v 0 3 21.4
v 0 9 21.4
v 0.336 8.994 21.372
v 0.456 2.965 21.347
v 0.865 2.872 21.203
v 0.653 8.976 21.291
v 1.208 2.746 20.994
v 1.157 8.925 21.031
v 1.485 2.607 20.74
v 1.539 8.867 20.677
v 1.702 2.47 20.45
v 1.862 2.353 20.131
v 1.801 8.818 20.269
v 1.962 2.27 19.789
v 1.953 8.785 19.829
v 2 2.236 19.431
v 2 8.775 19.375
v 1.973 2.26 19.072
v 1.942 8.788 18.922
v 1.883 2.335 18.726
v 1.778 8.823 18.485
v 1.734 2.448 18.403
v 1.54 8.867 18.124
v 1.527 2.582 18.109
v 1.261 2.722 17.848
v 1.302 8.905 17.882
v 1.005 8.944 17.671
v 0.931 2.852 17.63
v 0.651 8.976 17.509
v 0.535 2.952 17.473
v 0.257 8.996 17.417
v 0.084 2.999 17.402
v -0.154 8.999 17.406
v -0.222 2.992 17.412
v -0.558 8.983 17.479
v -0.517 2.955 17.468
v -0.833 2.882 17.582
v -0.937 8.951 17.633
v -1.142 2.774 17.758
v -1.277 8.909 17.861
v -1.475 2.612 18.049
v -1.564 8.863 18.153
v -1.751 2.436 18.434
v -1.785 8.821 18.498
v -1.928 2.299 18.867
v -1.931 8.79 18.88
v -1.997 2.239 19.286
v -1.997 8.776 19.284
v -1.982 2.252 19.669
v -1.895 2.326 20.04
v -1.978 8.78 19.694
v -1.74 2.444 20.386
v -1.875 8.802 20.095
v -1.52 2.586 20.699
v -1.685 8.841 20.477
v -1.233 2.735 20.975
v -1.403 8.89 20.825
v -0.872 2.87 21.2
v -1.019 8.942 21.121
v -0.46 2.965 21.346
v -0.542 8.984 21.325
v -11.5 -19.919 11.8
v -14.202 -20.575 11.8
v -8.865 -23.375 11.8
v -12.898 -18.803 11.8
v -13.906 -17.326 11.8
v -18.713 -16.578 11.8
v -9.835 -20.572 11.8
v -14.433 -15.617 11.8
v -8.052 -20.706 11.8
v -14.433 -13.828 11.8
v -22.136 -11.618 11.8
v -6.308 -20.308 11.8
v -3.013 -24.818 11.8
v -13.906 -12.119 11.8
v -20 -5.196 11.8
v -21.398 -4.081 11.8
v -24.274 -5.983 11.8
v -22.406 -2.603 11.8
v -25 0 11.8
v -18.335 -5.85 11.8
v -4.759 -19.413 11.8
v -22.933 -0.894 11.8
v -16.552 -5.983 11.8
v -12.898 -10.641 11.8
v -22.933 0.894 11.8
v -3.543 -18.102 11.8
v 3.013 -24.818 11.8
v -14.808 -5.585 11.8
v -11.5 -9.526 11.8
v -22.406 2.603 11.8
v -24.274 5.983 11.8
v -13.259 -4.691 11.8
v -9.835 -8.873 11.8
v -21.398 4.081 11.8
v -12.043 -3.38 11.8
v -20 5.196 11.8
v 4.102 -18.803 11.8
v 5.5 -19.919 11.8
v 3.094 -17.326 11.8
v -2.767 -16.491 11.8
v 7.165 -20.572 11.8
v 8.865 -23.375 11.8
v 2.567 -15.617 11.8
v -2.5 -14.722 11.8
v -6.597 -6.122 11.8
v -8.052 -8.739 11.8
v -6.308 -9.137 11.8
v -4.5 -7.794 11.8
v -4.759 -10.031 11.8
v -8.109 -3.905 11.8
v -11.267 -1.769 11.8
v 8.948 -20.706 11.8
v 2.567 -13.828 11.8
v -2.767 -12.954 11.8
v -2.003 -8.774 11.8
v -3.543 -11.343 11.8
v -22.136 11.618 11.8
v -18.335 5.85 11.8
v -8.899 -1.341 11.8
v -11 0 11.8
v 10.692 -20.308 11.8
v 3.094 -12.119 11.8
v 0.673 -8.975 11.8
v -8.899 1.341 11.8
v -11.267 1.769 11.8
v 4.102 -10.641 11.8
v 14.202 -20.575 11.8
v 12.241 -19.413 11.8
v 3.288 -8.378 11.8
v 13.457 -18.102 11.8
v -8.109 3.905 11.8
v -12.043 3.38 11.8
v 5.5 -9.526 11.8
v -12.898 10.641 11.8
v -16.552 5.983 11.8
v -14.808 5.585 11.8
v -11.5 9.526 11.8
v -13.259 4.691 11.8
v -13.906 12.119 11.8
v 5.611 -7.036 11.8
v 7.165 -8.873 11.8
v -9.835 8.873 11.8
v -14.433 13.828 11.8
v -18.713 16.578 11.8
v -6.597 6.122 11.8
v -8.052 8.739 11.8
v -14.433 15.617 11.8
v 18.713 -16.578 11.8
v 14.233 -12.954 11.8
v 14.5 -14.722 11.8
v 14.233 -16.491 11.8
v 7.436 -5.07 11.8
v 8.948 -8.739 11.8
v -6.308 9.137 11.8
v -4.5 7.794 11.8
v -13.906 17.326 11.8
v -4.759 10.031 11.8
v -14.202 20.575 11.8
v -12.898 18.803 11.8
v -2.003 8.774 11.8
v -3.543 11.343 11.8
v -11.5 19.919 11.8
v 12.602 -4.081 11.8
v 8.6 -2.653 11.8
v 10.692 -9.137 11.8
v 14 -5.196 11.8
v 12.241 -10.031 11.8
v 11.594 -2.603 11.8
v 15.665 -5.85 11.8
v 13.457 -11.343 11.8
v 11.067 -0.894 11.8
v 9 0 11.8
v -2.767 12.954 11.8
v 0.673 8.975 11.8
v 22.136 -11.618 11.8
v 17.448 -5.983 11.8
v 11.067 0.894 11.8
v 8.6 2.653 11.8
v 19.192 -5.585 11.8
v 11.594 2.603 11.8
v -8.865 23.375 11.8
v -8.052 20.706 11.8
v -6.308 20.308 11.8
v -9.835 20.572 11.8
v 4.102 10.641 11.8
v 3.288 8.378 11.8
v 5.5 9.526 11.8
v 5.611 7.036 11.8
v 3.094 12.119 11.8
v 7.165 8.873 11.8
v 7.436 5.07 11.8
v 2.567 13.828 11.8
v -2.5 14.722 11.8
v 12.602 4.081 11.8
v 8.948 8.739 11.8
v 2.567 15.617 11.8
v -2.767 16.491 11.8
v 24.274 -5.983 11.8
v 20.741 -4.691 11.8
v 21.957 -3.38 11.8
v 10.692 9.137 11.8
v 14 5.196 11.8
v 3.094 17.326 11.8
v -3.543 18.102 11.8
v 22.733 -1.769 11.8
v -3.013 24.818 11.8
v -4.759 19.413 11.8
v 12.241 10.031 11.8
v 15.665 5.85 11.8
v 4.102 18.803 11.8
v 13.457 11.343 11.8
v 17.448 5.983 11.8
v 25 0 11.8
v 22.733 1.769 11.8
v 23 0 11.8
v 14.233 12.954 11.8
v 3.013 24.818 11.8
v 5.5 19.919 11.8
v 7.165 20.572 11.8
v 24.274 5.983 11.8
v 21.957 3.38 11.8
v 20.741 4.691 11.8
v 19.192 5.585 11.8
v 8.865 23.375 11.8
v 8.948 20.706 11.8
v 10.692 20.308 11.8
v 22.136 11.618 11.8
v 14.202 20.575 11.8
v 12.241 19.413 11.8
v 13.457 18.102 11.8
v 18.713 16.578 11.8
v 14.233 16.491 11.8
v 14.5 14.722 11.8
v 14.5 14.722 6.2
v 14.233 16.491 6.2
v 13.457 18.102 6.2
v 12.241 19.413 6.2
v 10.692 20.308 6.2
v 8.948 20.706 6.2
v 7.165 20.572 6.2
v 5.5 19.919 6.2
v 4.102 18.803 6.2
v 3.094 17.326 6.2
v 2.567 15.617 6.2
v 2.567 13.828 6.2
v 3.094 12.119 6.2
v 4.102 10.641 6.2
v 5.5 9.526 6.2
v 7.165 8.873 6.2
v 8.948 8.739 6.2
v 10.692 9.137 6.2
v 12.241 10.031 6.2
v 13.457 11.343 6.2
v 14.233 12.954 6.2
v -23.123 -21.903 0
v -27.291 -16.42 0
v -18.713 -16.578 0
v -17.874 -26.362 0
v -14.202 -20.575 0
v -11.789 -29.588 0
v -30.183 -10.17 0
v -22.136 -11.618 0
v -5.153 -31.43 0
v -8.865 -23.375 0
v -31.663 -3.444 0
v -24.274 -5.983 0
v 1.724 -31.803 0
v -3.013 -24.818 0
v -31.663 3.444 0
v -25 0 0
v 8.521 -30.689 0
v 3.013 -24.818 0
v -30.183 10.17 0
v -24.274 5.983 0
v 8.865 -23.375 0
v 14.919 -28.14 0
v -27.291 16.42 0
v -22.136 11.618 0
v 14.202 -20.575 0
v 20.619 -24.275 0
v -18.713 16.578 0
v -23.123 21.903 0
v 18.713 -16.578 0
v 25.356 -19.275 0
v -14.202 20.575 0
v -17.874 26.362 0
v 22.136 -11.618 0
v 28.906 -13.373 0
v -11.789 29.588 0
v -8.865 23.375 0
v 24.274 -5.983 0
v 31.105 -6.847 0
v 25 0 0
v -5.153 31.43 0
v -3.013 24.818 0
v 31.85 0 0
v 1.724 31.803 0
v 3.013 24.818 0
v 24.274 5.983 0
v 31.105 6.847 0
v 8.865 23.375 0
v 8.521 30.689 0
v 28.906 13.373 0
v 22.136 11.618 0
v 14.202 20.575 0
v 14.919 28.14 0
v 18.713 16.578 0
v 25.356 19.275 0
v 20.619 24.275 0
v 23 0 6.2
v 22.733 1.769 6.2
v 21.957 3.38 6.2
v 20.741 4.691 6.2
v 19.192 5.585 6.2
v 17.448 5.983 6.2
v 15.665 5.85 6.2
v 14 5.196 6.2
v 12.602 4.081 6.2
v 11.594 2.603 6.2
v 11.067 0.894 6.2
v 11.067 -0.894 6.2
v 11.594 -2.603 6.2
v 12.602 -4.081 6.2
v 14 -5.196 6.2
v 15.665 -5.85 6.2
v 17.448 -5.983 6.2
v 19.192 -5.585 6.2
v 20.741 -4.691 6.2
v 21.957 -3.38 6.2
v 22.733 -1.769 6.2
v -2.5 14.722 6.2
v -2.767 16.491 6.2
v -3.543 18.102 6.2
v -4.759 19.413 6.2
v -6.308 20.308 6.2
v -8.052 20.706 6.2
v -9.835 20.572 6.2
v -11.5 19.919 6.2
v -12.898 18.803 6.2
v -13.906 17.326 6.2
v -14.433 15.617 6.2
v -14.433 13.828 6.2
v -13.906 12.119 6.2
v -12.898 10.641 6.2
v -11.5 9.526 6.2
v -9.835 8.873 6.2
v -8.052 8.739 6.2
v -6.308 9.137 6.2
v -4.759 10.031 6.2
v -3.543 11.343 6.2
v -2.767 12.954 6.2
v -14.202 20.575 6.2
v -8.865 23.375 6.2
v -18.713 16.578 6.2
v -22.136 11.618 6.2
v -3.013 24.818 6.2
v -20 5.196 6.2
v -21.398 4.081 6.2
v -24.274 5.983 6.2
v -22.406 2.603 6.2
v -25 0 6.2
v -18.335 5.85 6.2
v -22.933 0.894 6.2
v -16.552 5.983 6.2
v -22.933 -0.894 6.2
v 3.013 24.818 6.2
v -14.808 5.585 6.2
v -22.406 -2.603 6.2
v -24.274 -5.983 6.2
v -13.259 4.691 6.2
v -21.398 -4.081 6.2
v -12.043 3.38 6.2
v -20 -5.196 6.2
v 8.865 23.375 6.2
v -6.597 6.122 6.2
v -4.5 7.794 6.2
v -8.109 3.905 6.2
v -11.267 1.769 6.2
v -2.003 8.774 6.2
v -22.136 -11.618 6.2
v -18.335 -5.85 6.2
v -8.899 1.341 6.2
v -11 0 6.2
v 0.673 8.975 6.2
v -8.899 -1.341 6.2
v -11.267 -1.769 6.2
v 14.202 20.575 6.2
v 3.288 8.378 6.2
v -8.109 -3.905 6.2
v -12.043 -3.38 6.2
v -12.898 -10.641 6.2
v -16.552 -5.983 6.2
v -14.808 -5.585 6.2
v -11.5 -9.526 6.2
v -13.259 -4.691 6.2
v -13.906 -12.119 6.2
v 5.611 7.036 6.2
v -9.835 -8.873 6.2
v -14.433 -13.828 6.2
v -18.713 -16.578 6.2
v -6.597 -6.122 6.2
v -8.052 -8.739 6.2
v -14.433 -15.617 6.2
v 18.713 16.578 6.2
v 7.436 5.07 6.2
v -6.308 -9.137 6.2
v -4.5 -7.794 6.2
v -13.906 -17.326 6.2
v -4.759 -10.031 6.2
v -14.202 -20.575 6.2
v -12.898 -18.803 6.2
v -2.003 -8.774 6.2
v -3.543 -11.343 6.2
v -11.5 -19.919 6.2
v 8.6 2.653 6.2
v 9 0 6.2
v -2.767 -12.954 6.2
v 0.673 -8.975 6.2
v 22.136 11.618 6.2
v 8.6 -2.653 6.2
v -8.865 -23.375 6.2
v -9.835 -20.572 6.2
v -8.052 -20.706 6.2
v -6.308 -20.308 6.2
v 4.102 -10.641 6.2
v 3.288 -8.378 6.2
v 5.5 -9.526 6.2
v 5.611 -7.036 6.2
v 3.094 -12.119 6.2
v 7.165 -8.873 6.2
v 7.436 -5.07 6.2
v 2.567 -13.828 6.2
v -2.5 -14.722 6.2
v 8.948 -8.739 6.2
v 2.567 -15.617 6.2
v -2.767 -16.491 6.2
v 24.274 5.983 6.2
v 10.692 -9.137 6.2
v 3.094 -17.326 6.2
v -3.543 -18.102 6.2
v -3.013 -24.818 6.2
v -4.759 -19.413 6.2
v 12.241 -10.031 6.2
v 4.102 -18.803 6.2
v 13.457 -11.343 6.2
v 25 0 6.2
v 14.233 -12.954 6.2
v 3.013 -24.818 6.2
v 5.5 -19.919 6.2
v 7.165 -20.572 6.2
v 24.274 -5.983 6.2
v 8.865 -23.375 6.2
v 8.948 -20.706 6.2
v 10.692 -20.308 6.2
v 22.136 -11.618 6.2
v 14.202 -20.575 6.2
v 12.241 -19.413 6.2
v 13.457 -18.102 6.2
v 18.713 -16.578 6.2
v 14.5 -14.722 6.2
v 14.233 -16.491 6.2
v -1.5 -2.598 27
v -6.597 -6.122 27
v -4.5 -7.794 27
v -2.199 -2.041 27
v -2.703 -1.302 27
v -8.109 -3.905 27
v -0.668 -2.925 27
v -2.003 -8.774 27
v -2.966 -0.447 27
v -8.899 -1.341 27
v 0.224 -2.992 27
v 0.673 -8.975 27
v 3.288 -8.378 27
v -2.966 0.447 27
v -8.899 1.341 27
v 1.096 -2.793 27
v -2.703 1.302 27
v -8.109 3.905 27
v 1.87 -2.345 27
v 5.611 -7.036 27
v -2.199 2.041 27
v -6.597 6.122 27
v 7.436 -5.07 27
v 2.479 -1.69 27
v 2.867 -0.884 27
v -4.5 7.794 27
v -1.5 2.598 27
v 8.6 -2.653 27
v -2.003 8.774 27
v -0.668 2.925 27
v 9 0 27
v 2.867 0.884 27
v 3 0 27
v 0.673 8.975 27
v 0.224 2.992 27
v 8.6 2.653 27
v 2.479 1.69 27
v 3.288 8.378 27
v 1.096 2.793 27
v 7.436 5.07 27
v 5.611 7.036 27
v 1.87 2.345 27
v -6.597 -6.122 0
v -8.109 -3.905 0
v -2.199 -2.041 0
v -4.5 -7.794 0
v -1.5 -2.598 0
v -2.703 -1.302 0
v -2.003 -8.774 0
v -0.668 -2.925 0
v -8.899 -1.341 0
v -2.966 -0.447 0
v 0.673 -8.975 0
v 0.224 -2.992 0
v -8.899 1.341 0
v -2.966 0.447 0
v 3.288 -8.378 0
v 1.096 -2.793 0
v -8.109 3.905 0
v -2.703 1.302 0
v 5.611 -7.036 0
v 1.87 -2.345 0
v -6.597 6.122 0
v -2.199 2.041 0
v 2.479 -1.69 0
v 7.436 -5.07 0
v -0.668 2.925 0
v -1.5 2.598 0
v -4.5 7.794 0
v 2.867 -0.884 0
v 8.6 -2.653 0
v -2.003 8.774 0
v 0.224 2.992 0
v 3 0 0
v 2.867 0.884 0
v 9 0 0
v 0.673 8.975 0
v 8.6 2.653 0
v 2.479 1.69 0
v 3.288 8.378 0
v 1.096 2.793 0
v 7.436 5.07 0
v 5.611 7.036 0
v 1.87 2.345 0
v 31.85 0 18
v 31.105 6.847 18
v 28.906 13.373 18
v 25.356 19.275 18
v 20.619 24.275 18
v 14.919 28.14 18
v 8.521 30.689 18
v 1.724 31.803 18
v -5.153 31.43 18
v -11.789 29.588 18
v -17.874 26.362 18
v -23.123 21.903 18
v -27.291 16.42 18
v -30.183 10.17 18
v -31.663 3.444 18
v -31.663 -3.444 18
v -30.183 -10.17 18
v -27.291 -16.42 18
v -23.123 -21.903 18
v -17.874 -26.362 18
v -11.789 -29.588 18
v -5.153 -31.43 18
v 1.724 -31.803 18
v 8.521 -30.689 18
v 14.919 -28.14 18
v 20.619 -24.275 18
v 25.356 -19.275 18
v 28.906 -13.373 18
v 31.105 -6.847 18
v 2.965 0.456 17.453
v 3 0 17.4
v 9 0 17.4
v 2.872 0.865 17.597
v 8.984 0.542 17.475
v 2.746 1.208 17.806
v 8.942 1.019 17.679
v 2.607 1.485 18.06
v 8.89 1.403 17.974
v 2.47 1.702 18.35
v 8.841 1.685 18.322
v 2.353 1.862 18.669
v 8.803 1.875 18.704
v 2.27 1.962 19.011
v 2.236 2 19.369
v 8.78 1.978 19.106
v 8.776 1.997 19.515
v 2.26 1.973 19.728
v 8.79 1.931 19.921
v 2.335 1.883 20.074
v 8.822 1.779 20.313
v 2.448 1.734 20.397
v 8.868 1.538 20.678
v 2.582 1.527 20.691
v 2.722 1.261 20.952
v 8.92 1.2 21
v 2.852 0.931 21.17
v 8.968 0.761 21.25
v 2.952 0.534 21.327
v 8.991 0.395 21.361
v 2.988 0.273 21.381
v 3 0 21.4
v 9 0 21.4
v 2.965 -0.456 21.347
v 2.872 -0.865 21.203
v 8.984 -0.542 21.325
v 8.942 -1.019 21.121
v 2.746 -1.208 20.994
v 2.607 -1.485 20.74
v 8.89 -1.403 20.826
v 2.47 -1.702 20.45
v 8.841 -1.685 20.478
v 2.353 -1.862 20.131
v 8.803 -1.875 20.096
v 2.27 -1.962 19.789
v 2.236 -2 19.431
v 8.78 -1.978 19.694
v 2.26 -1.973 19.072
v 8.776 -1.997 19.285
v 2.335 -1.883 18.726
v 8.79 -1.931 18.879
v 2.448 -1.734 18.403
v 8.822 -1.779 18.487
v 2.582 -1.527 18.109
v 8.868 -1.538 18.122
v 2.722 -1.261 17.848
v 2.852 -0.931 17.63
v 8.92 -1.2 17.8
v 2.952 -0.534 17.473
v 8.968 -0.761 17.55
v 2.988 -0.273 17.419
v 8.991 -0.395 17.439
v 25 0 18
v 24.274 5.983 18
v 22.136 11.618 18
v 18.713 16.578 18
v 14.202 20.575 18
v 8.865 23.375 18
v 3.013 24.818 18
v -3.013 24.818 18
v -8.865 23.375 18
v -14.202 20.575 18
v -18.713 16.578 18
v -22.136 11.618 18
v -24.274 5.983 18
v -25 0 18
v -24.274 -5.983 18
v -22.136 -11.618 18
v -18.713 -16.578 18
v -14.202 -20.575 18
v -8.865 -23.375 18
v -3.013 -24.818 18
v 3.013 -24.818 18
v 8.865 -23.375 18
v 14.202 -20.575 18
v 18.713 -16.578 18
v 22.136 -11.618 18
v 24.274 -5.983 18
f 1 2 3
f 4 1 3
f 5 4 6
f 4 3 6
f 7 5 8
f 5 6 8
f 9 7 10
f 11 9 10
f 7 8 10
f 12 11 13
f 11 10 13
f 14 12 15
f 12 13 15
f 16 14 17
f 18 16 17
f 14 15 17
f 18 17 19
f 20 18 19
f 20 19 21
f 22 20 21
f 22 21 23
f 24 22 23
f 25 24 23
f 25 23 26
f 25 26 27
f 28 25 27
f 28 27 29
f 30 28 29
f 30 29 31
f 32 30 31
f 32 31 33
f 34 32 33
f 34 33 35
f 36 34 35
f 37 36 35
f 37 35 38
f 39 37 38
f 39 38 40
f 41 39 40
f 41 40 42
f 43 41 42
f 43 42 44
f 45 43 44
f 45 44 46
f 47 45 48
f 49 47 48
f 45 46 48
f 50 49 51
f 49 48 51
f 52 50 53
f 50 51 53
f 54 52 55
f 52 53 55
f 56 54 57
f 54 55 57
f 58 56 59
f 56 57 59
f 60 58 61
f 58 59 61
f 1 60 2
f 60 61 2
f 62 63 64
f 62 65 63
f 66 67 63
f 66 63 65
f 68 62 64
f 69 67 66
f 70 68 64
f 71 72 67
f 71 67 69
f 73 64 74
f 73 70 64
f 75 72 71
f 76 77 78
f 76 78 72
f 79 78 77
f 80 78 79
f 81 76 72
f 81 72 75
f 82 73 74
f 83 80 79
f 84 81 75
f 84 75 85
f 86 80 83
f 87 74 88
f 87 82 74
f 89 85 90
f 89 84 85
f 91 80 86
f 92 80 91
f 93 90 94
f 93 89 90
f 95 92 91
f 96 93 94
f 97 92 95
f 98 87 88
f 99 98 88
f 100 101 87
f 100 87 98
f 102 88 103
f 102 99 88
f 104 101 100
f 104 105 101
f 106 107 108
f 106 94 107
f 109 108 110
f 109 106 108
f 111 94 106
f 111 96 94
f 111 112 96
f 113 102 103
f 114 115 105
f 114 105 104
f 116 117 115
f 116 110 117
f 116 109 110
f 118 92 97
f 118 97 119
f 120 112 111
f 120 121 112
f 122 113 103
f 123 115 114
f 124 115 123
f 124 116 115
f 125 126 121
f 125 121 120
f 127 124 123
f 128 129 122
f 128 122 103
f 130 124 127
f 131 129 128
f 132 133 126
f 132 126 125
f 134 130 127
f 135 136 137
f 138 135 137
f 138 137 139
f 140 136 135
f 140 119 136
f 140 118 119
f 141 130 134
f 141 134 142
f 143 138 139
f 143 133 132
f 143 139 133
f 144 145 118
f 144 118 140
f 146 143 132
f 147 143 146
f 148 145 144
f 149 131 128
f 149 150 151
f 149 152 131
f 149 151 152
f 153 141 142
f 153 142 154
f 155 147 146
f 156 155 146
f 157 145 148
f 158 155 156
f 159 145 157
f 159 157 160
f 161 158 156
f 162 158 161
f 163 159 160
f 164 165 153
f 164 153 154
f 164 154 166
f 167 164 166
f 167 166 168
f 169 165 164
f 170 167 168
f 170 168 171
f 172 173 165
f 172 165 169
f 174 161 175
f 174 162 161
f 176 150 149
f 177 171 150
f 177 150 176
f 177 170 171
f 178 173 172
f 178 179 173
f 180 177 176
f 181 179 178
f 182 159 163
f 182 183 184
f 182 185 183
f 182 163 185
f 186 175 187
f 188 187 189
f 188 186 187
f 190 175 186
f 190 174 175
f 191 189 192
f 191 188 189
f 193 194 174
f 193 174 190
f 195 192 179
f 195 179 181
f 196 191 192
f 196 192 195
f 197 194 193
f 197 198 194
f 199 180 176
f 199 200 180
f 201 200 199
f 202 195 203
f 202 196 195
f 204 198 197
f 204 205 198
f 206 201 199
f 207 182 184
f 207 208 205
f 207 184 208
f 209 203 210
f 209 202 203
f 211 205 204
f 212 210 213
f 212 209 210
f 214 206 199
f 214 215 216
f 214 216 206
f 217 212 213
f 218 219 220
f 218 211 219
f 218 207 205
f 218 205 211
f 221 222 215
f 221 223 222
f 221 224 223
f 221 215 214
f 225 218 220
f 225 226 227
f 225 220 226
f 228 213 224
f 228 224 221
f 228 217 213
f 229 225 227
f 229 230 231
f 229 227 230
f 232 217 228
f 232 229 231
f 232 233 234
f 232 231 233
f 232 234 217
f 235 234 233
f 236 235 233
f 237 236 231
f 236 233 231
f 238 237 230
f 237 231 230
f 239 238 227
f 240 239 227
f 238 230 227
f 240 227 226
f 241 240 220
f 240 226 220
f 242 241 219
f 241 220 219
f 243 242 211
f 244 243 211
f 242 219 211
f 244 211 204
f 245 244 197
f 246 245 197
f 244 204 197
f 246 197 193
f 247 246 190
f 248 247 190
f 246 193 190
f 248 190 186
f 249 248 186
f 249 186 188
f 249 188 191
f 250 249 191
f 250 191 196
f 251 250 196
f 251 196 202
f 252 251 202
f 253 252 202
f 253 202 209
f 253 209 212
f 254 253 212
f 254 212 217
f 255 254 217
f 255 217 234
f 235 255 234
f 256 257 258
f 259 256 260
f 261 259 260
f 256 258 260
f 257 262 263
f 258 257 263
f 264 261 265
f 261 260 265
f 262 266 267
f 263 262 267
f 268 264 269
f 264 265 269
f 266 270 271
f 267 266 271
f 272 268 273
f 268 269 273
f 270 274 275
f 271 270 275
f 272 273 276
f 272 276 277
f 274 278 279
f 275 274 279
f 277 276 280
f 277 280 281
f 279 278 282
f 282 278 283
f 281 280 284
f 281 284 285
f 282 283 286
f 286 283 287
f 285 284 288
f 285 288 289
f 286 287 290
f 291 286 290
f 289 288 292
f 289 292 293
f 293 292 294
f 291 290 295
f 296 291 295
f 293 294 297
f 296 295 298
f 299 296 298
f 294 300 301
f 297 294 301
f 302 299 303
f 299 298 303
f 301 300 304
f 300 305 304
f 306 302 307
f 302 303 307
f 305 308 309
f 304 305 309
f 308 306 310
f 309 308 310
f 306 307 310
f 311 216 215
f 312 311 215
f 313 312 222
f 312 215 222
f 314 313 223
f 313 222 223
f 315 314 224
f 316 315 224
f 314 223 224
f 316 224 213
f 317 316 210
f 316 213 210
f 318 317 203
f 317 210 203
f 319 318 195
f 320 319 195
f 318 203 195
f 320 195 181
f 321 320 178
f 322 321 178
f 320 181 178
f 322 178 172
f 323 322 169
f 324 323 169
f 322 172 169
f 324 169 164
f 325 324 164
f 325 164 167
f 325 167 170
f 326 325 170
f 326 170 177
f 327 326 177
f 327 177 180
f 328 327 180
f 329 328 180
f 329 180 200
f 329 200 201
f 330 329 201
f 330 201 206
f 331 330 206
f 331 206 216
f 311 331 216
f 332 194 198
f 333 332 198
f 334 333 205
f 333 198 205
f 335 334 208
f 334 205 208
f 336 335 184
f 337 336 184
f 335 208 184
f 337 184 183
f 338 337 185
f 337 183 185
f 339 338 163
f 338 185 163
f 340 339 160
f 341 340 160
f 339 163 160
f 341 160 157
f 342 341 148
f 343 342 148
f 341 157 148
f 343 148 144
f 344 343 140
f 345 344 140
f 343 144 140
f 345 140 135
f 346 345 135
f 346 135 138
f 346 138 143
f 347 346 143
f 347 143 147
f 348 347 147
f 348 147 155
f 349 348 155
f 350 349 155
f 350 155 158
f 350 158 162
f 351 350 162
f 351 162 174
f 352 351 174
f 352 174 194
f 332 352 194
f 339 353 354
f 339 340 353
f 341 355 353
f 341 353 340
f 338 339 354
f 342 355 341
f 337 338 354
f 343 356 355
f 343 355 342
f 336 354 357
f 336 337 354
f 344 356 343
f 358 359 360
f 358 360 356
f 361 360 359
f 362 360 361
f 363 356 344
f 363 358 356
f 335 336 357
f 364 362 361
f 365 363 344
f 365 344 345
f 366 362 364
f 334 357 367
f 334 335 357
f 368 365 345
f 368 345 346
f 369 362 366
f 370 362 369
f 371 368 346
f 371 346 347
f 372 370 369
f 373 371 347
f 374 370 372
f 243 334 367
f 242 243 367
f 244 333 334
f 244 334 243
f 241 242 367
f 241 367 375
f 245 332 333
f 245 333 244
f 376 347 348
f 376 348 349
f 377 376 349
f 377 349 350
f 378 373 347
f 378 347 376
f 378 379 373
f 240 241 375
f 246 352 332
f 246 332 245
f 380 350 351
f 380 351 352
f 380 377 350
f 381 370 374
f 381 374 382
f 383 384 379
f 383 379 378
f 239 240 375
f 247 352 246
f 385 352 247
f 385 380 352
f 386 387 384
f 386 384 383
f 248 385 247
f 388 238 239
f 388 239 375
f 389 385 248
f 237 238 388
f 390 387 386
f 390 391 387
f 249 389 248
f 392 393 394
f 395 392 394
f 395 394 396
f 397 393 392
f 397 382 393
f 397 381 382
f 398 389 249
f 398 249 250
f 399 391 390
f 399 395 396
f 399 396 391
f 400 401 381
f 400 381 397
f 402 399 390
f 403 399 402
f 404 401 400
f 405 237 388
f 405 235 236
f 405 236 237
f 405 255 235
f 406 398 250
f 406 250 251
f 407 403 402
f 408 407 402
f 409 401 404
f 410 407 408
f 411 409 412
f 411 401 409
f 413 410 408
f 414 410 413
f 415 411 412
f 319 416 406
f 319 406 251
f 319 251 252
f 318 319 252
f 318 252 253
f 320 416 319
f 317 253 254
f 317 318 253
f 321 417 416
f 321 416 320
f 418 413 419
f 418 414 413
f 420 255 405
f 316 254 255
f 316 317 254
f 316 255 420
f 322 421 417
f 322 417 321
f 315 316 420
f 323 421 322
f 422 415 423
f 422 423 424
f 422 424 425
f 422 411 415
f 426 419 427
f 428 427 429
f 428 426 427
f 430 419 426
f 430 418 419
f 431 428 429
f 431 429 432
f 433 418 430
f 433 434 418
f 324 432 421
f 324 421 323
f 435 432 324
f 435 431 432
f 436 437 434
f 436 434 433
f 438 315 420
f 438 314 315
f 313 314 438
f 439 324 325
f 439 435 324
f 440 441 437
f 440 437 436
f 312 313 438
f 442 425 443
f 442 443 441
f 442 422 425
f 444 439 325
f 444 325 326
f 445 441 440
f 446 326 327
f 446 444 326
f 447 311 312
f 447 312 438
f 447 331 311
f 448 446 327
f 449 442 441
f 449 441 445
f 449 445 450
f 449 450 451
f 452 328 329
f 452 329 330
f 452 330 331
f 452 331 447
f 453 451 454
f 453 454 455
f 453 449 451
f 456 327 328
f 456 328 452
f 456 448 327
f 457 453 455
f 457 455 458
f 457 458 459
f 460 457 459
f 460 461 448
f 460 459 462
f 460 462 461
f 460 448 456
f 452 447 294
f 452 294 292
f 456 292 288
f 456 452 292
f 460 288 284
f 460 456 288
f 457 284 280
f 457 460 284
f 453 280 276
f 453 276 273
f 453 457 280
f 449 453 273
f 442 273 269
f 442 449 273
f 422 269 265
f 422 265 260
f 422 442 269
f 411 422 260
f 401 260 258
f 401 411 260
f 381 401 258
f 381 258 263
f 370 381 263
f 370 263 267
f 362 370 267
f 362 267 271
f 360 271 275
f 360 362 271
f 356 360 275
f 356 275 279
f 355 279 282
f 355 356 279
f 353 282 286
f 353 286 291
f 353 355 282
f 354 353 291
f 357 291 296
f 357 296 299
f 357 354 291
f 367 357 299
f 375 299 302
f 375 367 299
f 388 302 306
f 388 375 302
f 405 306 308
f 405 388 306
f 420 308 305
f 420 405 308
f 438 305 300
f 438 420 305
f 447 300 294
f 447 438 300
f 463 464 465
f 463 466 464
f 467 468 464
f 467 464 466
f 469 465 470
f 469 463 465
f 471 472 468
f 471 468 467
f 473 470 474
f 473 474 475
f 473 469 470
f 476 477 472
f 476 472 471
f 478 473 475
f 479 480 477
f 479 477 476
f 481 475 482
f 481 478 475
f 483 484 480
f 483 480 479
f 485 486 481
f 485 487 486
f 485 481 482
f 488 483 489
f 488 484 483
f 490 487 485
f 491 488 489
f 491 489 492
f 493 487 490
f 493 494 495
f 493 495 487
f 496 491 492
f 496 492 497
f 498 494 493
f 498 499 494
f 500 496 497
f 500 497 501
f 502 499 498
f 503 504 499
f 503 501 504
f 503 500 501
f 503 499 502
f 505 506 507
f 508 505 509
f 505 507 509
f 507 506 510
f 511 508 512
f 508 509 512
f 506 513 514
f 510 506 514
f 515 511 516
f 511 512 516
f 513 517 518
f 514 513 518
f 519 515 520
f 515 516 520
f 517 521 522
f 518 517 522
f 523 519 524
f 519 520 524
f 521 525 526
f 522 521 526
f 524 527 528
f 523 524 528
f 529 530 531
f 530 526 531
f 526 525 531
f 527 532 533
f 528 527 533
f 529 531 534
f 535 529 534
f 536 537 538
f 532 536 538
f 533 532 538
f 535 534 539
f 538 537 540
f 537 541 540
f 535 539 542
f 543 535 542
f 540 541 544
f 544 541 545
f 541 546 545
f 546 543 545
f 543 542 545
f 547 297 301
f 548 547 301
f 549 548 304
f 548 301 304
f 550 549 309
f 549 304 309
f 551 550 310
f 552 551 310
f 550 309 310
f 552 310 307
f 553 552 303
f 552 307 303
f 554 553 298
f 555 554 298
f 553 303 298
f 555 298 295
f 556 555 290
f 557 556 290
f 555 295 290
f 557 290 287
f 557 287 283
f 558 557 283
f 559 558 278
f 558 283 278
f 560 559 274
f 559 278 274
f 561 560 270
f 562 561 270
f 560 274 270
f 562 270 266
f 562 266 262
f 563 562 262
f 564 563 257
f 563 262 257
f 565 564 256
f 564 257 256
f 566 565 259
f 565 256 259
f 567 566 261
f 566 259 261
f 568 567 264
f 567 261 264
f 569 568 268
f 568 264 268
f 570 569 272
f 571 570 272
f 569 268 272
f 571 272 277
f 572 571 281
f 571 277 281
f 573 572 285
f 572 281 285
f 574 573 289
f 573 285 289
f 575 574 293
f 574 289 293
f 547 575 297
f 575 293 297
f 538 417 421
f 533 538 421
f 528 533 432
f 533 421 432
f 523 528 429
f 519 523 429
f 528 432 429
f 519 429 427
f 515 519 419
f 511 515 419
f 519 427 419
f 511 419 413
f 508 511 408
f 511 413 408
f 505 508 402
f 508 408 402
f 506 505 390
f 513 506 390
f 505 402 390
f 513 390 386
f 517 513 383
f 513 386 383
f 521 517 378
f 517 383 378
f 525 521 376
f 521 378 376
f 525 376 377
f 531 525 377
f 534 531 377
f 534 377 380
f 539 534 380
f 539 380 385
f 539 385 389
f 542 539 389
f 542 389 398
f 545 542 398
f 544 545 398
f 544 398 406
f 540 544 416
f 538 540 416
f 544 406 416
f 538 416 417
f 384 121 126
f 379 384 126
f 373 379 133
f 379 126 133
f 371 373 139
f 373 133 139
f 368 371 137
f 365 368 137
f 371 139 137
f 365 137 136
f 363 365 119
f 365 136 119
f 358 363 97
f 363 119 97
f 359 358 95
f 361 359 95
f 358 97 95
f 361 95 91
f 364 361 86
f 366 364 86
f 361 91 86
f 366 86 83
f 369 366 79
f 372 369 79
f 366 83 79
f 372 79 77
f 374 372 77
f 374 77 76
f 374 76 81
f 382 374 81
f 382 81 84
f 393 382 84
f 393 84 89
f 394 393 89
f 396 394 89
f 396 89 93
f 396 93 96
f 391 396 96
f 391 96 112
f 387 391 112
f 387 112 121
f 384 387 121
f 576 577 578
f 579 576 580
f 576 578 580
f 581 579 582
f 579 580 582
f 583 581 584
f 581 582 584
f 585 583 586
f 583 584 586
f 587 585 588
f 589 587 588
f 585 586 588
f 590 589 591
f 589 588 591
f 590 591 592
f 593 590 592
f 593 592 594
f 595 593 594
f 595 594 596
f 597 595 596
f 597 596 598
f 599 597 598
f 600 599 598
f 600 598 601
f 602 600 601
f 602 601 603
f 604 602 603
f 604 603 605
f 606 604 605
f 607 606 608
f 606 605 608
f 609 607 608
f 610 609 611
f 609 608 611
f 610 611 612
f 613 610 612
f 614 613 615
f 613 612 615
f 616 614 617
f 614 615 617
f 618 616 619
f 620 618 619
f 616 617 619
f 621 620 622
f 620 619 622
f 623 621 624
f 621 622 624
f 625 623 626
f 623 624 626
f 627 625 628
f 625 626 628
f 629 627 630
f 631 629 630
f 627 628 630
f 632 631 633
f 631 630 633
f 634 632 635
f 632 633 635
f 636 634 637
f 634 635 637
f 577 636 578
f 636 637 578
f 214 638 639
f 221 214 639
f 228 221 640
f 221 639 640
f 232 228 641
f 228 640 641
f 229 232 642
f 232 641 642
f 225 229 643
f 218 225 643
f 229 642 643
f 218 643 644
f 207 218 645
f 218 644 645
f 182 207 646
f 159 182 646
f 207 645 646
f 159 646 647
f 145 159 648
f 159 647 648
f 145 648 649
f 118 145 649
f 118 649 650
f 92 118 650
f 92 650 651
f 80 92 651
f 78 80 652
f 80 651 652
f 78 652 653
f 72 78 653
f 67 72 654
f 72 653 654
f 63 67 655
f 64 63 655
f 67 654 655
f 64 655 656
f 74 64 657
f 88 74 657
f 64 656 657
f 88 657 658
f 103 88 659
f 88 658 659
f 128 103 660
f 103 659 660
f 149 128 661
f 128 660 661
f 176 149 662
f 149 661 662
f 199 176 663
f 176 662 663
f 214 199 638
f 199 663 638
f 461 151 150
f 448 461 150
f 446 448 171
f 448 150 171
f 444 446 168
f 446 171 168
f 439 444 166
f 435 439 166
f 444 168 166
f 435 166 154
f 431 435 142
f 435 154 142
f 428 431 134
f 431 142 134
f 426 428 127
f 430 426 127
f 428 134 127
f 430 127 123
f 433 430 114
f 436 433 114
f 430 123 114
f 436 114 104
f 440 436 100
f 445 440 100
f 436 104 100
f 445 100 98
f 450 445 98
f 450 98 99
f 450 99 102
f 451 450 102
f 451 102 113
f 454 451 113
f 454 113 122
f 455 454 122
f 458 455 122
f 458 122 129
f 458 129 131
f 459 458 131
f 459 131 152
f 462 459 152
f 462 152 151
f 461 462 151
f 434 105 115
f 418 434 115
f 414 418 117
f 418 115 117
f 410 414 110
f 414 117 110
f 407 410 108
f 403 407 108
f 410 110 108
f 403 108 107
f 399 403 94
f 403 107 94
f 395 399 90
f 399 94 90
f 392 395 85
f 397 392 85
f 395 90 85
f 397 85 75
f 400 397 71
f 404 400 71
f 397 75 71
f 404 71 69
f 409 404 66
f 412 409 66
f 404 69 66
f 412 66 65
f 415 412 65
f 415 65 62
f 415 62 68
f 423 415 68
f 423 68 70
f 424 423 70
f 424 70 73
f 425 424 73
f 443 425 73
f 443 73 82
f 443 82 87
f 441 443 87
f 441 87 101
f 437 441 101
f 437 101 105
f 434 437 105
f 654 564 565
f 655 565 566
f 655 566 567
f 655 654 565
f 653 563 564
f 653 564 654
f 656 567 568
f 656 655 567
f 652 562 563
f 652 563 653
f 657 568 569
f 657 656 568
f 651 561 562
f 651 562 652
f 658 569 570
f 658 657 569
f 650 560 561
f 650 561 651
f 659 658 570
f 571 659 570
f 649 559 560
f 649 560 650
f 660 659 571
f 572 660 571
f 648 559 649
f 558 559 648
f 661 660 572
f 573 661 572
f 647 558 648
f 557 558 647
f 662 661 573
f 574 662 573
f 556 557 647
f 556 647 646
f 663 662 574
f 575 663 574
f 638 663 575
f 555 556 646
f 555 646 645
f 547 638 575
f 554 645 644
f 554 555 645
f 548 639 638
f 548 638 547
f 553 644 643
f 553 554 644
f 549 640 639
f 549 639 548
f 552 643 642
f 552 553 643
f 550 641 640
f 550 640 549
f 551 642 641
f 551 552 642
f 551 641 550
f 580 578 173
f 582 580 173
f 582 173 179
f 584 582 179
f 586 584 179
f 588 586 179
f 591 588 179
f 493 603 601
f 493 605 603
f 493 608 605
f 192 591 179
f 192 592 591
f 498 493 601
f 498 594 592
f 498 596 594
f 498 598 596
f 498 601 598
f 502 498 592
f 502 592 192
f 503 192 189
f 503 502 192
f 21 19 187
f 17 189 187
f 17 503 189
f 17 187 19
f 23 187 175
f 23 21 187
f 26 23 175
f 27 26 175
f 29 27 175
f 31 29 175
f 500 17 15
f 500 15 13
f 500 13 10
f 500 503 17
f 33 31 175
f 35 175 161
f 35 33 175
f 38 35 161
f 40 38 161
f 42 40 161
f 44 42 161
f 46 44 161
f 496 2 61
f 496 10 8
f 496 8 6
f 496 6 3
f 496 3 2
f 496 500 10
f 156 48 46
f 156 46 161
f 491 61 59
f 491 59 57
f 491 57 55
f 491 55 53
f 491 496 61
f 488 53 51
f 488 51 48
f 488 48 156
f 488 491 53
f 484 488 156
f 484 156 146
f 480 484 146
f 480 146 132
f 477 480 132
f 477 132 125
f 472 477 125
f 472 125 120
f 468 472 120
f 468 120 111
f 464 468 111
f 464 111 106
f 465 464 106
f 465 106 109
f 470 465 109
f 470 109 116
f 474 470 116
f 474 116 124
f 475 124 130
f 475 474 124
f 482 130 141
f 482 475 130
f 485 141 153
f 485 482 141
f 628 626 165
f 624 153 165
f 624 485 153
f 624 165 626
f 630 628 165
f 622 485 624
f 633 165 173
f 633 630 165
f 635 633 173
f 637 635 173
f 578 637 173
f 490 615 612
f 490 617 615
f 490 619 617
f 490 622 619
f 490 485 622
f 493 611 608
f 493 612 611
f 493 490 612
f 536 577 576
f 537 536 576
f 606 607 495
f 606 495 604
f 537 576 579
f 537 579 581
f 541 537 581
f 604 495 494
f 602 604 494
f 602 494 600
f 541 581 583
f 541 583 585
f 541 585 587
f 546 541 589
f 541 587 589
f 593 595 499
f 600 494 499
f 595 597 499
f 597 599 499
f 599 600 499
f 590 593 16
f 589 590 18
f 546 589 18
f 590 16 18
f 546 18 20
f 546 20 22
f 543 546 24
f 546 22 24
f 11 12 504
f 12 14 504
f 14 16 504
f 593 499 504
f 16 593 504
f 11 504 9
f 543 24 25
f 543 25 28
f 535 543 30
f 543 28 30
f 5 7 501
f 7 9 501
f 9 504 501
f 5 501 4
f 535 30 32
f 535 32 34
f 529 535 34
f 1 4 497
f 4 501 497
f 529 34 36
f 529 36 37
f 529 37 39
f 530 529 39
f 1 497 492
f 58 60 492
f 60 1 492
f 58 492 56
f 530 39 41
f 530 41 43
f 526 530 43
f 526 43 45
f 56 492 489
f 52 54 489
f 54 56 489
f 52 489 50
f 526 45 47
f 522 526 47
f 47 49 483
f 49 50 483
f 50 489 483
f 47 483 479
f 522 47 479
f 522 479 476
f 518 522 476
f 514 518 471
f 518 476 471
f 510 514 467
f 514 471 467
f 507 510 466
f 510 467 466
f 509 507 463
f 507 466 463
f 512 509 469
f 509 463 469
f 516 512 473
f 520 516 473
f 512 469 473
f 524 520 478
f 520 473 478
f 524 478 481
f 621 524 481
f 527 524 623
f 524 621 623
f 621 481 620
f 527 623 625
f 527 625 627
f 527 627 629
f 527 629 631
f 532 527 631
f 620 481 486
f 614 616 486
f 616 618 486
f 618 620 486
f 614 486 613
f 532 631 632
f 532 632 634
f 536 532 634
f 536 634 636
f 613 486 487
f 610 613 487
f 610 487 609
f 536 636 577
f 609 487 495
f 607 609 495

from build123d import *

# Parameters (mm, degrees)
SKETCH_1_R                = 31.85
EXTRUDE_1_DEPTH           = 18
SKETCH_2_R                = 25
SKETCH_2_R_2              = 9
CUT_EXTRUDE_1_DEPTH       = 6.2
CUT_EXTRUDE_START         = -6.2
SKETCH_3_R                = 25
SKETCH_3_R_2              = 9
CUT_EXTRUDE_5_DEPTH       = 6.2
EXTRUDE_START             = 9
SKETCH_4_R                = 9
EXTRUDE_2_DEPTH           = 9
SKETCH_5_R                = 3
CUT_EXTRUDE_6_DEPTH       = 53.515188279
SKETCH_6_R                = 6
CUT_EXTRUDE_7_DEPTH       = 48.538247759
CUT_EXTRUDE_10_REACH      = 60.414
CUT_EXTRUDE_10_END_RADIUS = 3
SKETCH_10_R               = 2
CUT_EXTRUDE_11_REACH      = 60.414
CUT_EXTRUDE_11_END_RADIUS = 3
SKETCH_7_R                = 2


with BuildPart() as part:
    # 草图1 → 凸台-拉伸1 (new body)
    with BuildSketch(Plane.XY):
        Circle(SKETCH_1_R)
    extrude(amount=EXTRUDE_1_DEPTH)

    # 草图2 → 切除-拉伸1 (cut)
    with BuildSketch(Plane.XY.offset(18)):
        Circle(SKETCH_2_R)
        Circle(SKETCH_2_R_2, mode=Mode.SUBTRACT)
    extrude(amount=-CUT_EXTRUDE_1_DEPTH, mode=Mode.SUBTRACT)

    # 草图3 → 切除-拉伸5 (cut)
    with BuildSketch(Plane(origin=(0, 0, 0), x_dir=(-1, 0, 0), z_dir=(0, 0, -1)).offset(CUT_EXTRUDE_START)):
        with Locations(Location((0, 0, 0), (0, 0, 180))):
            Circle(SKETCH_3_R)
        with Locations(Location((0, 0, 0), (0, 0, 180))):
            Circle(SKETCH_3_R_2, mode=Mode.SUBTRACT)
    extrude(amount=CUT_EXTRUDE_5_DEPTH, mode=Mode.SUBTRACT)

    # 草图4 → 凸台-拉伸2 (add)
    with BuildSketch(Plane.XY.offset(18).offset(EXTRUDE_START)):
        Circle(SKETCH_4_R)
    extrude(amount=-EXTRUDE_2_DEPTH)

    # 草图5 → 切除-拉伸6 (cut, through all)
    with BuildSketch(Plane.XY.offset(27)):
        Circle(SKETCH_5_R)
    extrude(amount=-CUT_EXTRUDE_6_DEPTH, mode=Mode.SUBTRACT)

    # 草图6 → 切除-拉伸7 (cut, through all)
    with BuildSketch(Plane.XY.offset(11.8)):
        with Locations((-17, 0)):
            Circle(SKETCH_6_R)
        with Locations((-8.5, 14.722431864)):
            Circle(SKETCH_6_R)
        with Locations((8.5, 14.722431864)):
            Circle(SKETCH_6_R)
        with Locations((17, 0)):
            Circle(SKETCH_6_R)
        with Locations((8.5, -14.722431864)):
            Circle(SKETCH_6_R)
        with Locations((-8.5, -14.722431864)):
            Circle(SKETCH_6_R)
    extrude(amount=-CUT_EXTRUDE_7_DEPTH, mode=Mode.SUBTRACT)

    # 切除-拉伸10: up to this cylinder (the profile starts outside it)
    cut_extrude_10_end = Plane(origin=(0, 0, 19.4), z_dir=(0, 0, 1)) * Cylinder(CUT_EXTRUDE_10_END_RADIUS, 127.828, mode=Mode.PRIVATE)
    # 草图10 → 切除-拉伸10 (cut, up to the surface)
    with BuildSketch(Plane(origin=(0, 9, 0), x_dir=(1, 0, 0), z_dir=(0, 1, 0)), mode=Mode.PRIVATE) as cut_extrude_10_sk1:
        with Locations(Location((0, -19.4, 0), (0, 0, 270))):
            Circle(SKETCH_10_R)
    cut_extrude_10_tool1 = extrude(cut_extrude_10_sk1.sketch, amount=-CUT_EXTRUDE_10_REACH, mode=Mode.PRIVATE) - cut_extrude_10_end
    add(cut_extrude_10_tool1.solids().sort_by_distance((0, 9, 19.4))[0], mode=Mode.SUBTRACT)

    # 切除-拉伸11: up to this cylinder (the profile starts outside it)
    cut_extrude_11_end = Plane(origin=(0, 0, 19.4), z_dir=(0, 0, 1)) * Cylinder(CUT_EXTRUDE_11_END_RADIUS, 127.828, mode=Mode.PRIVATE)
    # 草图7 → 切除-拉伸11 (cut, up to the surface)
    with BuildSketch(Plane(origin=(9, 0, 0), x_dir=(0, 0, -1), z_dir=(1, 0, 0)), mode=Mode.PRIVATE) as cut_extrude_11_sk1:
        with Locations((-19.4, 0)):
            Circle(SKETCH_7_R)
    cut_extrude_11_tool1 = extrude(cut_extrude_11_sk1.sketch, amount=-CUT_EXTRUDE_11_REACH, mode=Mode.PRIVATE) - cut_extrude_11_end
    add(cut_extrude_11_tool1.solids().sort_by_distance((9, 0, 19.4))[0], mode=Mode.SUBTRACT)


solid = part.part
